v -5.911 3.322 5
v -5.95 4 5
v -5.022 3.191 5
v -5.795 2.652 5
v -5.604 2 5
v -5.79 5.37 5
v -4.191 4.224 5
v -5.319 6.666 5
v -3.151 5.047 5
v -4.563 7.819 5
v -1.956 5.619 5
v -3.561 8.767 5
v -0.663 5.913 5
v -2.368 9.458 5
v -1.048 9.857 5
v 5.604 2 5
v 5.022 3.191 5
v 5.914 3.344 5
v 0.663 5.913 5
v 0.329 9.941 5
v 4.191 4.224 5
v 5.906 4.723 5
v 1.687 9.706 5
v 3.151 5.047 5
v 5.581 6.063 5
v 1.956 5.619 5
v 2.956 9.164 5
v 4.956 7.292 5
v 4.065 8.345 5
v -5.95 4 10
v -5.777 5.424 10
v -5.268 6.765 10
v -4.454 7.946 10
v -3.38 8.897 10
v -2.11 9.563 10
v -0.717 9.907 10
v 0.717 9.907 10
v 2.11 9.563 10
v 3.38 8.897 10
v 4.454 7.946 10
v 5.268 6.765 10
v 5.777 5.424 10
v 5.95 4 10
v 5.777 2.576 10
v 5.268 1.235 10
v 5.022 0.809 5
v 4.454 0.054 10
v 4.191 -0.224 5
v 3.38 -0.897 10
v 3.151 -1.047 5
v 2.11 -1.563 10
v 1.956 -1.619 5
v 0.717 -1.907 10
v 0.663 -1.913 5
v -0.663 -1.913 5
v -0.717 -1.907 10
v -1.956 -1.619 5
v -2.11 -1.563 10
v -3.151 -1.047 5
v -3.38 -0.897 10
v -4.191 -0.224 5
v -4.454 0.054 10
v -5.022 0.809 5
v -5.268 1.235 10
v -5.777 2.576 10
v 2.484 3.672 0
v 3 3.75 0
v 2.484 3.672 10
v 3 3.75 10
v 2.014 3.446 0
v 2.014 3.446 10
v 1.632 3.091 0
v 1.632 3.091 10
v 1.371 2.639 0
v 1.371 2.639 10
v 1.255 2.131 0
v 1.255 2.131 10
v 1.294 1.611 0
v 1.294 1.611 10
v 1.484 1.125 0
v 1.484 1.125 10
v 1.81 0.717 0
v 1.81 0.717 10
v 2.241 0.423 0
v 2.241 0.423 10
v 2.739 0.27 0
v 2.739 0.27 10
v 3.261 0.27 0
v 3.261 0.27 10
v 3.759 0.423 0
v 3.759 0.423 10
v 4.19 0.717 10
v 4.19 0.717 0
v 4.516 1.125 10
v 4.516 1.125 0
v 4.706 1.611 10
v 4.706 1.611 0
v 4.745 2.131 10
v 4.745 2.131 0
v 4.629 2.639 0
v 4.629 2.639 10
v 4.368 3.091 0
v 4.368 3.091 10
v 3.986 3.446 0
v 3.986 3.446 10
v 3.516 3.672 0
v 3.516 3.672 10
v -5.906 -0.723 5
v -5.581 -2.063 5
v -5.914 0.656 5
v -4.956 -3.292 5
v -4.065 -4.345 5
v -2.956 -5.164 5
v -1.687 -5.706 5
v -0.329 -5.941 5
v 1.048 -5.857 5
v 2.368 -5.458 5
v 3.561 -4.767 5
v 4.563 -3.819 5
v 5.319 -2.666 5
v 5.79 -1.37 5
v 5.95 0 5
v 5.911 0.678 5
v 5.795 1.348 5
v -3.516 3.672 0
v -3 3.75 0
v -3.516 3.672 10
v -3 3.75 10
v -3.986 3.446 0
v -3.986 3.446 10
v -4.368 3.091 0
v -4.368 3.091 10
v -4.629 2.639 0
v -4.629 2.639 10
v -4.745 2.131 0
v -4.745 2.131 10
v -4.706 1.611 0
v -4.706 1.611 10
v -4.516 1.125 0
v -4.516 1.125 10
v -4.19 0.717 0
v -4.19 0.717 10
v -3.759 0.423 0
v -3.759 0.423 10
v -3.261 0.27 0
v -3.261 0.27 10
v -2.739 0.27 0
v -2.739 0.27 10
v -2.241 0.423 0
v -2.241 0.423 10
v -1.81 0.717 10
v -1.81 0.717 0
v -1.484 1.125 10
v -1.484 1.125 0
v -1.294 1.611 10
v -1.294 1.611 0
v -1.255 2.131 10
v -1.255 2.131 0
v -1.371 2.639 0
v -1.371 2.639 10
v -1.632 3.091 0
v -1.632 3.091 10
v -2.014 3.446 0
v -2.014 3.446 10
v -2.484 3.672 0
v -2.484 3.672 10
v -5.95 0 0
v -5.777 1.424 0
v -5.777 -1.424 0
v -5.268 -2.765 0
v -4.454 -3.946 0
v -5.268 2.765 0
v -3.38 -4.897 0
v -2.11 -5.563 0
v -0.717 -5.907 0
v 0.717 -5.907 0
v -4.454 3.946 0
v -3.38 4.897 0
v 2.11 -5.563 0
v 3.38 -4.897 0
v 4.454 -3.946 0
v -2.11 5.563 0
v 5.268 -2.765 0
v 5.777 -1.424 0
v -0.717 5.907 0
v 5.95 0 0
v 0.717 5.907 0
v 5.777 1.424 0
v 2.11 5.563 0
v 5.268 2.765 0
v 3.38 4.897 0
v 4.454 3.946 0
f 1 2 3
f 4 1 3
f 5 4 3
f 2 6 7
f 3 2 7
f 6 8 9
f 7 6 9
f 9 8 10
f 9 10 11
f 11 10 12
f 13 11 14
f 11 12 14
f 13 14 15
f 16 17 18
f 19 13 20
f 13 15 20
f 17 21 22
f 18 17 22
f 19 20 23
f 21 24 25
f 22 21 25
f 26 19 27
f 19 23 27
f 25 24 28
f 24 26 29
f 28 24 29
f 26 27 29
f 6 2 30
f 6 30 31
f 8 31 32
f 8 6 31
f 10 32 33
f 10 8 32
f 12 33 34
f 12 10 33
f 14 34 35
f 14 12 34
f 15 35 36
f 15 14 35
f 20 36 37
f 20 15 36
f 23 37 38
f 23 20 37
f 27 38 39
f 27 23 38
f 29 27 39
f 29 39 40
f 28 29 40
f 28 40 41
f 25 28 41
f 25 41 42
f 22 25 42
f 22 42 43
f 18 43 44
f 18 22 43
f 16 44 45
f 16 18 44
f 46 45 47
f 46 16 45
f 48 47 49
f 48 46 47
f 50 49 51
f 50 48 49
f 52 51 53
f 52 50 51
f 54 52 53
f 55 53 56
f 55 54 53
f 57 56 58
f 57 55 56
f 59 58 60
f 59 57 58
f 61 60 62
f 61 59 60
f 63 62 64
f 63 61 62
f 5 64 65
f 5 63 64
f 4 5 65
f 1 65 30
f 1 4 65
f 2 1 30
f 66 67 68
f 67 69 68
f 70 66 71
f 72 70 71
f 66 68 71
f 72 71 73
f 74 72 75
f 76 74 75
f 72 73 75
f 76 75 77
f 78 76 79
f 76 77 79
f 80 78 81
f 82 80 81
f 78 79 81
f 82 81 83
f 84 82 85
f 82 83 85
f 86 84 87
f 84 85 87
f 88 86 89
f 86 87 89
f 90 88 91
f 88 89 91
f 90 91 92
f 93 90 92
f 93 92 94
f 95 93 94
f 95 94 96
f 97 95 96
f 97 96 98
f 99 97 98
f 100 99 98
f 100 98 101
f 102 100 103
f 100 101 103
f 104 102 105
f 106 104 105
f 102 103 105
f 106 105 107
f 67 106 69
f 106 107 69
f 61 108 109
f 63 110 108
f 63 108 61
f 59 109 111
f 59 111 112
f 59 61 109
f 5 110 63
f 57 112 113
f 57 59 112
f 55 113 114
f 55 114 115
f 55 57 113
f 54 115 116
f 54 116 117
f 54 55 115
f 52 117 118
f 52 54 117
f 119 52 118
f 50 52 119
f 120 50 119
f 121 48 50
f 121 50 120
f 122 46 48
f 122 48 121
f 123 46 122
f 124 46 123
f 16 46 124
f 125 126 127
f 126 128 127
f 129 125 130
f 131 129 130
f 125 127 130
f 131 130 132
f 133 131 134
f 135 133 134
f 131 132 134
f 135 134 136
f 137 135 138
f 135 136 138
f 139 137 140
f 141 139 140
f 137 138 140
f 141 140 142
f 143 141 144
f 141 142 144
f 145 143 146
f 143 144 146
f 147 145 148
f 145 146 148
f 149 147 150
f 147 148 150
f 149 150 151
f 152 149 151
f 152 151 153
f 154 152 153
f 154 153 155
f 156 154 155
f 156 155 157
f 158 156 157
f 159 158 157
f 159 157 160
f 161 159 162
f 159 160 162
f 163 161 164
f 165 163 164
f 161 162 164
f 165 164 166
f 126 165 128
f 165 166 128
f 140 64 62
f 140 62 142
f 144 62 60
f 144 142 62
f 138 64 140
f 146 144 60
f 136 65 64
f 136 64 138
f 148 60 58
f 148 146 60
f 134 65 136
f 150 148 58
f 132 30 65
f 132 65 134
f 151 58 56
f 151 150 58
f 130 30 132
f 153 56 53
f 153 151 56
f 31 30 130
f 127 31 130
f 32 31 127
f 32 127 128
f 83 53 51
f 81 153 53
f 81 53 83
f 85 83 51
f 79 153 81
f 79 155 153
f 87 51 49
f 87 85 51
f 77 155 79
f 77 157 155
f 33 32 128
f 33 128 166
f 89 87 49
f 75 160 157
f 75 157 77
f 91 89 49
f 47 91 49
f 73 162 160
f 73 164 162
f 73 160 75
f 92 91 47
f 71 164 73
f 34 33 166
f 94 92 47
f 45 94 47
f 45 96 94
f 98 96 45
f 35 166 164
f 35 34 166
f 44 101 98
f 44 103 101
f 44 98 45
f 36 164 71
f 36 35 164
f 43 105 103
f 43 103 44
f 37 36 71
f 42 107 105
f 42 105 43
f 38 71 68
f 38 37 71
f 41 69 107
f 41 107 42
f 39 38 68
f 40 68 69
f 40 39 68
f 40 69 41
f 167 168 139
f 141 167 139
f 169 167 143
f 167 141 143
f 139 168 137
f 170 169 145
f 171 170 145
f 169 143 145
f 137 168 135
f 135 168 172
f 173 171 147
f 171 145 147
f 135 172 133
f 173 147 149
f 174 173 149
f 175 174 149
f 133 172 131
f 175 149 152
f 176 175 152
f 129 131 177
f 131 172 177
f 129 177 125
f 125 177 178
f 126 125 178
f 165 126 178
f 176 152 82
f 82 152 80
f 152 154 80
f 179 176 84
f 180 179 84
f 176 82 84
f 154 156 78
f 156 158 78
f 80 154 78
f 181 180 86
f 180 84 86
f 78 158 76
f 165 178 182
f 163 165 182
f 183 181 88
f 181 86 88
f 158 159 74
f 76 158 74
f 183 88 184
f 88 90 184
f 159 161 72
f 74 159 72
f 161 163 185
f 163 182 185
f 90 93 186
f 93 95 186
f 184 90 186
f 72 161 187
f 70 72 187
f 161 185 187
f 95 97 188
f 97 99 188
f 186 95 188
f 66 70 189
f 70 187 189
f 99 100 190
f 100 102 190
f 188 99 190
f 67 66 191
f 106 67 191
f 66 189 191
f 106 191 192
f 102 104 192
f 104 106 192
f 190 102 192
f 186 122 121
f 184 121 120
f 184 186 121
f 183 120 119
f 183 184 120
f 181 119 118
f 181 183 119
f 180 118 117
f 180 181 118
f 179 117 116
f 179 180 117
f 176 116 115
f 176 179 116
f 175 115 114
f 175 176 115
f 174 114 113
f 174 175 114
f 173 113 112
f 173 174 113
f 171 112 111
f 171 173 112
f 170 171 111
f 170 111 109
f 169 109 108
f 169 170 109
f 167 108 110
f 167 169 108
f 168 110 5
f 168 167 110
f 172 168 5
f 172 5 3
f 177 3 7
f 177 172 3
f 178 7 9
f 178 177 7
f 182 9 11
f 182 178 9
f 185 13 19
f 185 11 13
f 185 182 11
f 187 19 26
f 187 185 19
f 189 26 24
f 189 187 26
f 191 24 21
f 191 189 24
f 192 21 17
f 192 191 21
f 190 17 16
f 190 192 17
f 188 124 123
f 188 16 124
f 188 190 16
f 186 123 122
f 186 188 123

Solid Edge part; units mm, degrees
sketch "Sketch1" plane through (0, 0, 0) normal (0, 0, 1) x (1, 0, 0)
  circle A0 centre (0, 0) radius 5.95
extrude "ExtrudedProtrusion_1" add sketch "Sketch1" along normal blind 5
sketch "Sketch2" plane through (0, 0, 5) normal (0, 0, 1) x (-1, 0, 0)
  circle A0 centre (0, -4) radius 5.95
extrude "ExtrudedProtrusion_5" add sketch "Sketch2" along normal blind 5
sketch "Sketch3" plane through (0, 4, 10) normal (0, 0, 1) x (0, 1, 0)
  circle A0 centre (-2, 3) radius 1.75
  circle A1 centre (-2, -3) radius 1.75
  dimension "D1" = 2
  dimension "D2" = 3.5
  dimension "D3" = 3
extrude "Cutout1" cut sketch "Sketch3" against normal through all
